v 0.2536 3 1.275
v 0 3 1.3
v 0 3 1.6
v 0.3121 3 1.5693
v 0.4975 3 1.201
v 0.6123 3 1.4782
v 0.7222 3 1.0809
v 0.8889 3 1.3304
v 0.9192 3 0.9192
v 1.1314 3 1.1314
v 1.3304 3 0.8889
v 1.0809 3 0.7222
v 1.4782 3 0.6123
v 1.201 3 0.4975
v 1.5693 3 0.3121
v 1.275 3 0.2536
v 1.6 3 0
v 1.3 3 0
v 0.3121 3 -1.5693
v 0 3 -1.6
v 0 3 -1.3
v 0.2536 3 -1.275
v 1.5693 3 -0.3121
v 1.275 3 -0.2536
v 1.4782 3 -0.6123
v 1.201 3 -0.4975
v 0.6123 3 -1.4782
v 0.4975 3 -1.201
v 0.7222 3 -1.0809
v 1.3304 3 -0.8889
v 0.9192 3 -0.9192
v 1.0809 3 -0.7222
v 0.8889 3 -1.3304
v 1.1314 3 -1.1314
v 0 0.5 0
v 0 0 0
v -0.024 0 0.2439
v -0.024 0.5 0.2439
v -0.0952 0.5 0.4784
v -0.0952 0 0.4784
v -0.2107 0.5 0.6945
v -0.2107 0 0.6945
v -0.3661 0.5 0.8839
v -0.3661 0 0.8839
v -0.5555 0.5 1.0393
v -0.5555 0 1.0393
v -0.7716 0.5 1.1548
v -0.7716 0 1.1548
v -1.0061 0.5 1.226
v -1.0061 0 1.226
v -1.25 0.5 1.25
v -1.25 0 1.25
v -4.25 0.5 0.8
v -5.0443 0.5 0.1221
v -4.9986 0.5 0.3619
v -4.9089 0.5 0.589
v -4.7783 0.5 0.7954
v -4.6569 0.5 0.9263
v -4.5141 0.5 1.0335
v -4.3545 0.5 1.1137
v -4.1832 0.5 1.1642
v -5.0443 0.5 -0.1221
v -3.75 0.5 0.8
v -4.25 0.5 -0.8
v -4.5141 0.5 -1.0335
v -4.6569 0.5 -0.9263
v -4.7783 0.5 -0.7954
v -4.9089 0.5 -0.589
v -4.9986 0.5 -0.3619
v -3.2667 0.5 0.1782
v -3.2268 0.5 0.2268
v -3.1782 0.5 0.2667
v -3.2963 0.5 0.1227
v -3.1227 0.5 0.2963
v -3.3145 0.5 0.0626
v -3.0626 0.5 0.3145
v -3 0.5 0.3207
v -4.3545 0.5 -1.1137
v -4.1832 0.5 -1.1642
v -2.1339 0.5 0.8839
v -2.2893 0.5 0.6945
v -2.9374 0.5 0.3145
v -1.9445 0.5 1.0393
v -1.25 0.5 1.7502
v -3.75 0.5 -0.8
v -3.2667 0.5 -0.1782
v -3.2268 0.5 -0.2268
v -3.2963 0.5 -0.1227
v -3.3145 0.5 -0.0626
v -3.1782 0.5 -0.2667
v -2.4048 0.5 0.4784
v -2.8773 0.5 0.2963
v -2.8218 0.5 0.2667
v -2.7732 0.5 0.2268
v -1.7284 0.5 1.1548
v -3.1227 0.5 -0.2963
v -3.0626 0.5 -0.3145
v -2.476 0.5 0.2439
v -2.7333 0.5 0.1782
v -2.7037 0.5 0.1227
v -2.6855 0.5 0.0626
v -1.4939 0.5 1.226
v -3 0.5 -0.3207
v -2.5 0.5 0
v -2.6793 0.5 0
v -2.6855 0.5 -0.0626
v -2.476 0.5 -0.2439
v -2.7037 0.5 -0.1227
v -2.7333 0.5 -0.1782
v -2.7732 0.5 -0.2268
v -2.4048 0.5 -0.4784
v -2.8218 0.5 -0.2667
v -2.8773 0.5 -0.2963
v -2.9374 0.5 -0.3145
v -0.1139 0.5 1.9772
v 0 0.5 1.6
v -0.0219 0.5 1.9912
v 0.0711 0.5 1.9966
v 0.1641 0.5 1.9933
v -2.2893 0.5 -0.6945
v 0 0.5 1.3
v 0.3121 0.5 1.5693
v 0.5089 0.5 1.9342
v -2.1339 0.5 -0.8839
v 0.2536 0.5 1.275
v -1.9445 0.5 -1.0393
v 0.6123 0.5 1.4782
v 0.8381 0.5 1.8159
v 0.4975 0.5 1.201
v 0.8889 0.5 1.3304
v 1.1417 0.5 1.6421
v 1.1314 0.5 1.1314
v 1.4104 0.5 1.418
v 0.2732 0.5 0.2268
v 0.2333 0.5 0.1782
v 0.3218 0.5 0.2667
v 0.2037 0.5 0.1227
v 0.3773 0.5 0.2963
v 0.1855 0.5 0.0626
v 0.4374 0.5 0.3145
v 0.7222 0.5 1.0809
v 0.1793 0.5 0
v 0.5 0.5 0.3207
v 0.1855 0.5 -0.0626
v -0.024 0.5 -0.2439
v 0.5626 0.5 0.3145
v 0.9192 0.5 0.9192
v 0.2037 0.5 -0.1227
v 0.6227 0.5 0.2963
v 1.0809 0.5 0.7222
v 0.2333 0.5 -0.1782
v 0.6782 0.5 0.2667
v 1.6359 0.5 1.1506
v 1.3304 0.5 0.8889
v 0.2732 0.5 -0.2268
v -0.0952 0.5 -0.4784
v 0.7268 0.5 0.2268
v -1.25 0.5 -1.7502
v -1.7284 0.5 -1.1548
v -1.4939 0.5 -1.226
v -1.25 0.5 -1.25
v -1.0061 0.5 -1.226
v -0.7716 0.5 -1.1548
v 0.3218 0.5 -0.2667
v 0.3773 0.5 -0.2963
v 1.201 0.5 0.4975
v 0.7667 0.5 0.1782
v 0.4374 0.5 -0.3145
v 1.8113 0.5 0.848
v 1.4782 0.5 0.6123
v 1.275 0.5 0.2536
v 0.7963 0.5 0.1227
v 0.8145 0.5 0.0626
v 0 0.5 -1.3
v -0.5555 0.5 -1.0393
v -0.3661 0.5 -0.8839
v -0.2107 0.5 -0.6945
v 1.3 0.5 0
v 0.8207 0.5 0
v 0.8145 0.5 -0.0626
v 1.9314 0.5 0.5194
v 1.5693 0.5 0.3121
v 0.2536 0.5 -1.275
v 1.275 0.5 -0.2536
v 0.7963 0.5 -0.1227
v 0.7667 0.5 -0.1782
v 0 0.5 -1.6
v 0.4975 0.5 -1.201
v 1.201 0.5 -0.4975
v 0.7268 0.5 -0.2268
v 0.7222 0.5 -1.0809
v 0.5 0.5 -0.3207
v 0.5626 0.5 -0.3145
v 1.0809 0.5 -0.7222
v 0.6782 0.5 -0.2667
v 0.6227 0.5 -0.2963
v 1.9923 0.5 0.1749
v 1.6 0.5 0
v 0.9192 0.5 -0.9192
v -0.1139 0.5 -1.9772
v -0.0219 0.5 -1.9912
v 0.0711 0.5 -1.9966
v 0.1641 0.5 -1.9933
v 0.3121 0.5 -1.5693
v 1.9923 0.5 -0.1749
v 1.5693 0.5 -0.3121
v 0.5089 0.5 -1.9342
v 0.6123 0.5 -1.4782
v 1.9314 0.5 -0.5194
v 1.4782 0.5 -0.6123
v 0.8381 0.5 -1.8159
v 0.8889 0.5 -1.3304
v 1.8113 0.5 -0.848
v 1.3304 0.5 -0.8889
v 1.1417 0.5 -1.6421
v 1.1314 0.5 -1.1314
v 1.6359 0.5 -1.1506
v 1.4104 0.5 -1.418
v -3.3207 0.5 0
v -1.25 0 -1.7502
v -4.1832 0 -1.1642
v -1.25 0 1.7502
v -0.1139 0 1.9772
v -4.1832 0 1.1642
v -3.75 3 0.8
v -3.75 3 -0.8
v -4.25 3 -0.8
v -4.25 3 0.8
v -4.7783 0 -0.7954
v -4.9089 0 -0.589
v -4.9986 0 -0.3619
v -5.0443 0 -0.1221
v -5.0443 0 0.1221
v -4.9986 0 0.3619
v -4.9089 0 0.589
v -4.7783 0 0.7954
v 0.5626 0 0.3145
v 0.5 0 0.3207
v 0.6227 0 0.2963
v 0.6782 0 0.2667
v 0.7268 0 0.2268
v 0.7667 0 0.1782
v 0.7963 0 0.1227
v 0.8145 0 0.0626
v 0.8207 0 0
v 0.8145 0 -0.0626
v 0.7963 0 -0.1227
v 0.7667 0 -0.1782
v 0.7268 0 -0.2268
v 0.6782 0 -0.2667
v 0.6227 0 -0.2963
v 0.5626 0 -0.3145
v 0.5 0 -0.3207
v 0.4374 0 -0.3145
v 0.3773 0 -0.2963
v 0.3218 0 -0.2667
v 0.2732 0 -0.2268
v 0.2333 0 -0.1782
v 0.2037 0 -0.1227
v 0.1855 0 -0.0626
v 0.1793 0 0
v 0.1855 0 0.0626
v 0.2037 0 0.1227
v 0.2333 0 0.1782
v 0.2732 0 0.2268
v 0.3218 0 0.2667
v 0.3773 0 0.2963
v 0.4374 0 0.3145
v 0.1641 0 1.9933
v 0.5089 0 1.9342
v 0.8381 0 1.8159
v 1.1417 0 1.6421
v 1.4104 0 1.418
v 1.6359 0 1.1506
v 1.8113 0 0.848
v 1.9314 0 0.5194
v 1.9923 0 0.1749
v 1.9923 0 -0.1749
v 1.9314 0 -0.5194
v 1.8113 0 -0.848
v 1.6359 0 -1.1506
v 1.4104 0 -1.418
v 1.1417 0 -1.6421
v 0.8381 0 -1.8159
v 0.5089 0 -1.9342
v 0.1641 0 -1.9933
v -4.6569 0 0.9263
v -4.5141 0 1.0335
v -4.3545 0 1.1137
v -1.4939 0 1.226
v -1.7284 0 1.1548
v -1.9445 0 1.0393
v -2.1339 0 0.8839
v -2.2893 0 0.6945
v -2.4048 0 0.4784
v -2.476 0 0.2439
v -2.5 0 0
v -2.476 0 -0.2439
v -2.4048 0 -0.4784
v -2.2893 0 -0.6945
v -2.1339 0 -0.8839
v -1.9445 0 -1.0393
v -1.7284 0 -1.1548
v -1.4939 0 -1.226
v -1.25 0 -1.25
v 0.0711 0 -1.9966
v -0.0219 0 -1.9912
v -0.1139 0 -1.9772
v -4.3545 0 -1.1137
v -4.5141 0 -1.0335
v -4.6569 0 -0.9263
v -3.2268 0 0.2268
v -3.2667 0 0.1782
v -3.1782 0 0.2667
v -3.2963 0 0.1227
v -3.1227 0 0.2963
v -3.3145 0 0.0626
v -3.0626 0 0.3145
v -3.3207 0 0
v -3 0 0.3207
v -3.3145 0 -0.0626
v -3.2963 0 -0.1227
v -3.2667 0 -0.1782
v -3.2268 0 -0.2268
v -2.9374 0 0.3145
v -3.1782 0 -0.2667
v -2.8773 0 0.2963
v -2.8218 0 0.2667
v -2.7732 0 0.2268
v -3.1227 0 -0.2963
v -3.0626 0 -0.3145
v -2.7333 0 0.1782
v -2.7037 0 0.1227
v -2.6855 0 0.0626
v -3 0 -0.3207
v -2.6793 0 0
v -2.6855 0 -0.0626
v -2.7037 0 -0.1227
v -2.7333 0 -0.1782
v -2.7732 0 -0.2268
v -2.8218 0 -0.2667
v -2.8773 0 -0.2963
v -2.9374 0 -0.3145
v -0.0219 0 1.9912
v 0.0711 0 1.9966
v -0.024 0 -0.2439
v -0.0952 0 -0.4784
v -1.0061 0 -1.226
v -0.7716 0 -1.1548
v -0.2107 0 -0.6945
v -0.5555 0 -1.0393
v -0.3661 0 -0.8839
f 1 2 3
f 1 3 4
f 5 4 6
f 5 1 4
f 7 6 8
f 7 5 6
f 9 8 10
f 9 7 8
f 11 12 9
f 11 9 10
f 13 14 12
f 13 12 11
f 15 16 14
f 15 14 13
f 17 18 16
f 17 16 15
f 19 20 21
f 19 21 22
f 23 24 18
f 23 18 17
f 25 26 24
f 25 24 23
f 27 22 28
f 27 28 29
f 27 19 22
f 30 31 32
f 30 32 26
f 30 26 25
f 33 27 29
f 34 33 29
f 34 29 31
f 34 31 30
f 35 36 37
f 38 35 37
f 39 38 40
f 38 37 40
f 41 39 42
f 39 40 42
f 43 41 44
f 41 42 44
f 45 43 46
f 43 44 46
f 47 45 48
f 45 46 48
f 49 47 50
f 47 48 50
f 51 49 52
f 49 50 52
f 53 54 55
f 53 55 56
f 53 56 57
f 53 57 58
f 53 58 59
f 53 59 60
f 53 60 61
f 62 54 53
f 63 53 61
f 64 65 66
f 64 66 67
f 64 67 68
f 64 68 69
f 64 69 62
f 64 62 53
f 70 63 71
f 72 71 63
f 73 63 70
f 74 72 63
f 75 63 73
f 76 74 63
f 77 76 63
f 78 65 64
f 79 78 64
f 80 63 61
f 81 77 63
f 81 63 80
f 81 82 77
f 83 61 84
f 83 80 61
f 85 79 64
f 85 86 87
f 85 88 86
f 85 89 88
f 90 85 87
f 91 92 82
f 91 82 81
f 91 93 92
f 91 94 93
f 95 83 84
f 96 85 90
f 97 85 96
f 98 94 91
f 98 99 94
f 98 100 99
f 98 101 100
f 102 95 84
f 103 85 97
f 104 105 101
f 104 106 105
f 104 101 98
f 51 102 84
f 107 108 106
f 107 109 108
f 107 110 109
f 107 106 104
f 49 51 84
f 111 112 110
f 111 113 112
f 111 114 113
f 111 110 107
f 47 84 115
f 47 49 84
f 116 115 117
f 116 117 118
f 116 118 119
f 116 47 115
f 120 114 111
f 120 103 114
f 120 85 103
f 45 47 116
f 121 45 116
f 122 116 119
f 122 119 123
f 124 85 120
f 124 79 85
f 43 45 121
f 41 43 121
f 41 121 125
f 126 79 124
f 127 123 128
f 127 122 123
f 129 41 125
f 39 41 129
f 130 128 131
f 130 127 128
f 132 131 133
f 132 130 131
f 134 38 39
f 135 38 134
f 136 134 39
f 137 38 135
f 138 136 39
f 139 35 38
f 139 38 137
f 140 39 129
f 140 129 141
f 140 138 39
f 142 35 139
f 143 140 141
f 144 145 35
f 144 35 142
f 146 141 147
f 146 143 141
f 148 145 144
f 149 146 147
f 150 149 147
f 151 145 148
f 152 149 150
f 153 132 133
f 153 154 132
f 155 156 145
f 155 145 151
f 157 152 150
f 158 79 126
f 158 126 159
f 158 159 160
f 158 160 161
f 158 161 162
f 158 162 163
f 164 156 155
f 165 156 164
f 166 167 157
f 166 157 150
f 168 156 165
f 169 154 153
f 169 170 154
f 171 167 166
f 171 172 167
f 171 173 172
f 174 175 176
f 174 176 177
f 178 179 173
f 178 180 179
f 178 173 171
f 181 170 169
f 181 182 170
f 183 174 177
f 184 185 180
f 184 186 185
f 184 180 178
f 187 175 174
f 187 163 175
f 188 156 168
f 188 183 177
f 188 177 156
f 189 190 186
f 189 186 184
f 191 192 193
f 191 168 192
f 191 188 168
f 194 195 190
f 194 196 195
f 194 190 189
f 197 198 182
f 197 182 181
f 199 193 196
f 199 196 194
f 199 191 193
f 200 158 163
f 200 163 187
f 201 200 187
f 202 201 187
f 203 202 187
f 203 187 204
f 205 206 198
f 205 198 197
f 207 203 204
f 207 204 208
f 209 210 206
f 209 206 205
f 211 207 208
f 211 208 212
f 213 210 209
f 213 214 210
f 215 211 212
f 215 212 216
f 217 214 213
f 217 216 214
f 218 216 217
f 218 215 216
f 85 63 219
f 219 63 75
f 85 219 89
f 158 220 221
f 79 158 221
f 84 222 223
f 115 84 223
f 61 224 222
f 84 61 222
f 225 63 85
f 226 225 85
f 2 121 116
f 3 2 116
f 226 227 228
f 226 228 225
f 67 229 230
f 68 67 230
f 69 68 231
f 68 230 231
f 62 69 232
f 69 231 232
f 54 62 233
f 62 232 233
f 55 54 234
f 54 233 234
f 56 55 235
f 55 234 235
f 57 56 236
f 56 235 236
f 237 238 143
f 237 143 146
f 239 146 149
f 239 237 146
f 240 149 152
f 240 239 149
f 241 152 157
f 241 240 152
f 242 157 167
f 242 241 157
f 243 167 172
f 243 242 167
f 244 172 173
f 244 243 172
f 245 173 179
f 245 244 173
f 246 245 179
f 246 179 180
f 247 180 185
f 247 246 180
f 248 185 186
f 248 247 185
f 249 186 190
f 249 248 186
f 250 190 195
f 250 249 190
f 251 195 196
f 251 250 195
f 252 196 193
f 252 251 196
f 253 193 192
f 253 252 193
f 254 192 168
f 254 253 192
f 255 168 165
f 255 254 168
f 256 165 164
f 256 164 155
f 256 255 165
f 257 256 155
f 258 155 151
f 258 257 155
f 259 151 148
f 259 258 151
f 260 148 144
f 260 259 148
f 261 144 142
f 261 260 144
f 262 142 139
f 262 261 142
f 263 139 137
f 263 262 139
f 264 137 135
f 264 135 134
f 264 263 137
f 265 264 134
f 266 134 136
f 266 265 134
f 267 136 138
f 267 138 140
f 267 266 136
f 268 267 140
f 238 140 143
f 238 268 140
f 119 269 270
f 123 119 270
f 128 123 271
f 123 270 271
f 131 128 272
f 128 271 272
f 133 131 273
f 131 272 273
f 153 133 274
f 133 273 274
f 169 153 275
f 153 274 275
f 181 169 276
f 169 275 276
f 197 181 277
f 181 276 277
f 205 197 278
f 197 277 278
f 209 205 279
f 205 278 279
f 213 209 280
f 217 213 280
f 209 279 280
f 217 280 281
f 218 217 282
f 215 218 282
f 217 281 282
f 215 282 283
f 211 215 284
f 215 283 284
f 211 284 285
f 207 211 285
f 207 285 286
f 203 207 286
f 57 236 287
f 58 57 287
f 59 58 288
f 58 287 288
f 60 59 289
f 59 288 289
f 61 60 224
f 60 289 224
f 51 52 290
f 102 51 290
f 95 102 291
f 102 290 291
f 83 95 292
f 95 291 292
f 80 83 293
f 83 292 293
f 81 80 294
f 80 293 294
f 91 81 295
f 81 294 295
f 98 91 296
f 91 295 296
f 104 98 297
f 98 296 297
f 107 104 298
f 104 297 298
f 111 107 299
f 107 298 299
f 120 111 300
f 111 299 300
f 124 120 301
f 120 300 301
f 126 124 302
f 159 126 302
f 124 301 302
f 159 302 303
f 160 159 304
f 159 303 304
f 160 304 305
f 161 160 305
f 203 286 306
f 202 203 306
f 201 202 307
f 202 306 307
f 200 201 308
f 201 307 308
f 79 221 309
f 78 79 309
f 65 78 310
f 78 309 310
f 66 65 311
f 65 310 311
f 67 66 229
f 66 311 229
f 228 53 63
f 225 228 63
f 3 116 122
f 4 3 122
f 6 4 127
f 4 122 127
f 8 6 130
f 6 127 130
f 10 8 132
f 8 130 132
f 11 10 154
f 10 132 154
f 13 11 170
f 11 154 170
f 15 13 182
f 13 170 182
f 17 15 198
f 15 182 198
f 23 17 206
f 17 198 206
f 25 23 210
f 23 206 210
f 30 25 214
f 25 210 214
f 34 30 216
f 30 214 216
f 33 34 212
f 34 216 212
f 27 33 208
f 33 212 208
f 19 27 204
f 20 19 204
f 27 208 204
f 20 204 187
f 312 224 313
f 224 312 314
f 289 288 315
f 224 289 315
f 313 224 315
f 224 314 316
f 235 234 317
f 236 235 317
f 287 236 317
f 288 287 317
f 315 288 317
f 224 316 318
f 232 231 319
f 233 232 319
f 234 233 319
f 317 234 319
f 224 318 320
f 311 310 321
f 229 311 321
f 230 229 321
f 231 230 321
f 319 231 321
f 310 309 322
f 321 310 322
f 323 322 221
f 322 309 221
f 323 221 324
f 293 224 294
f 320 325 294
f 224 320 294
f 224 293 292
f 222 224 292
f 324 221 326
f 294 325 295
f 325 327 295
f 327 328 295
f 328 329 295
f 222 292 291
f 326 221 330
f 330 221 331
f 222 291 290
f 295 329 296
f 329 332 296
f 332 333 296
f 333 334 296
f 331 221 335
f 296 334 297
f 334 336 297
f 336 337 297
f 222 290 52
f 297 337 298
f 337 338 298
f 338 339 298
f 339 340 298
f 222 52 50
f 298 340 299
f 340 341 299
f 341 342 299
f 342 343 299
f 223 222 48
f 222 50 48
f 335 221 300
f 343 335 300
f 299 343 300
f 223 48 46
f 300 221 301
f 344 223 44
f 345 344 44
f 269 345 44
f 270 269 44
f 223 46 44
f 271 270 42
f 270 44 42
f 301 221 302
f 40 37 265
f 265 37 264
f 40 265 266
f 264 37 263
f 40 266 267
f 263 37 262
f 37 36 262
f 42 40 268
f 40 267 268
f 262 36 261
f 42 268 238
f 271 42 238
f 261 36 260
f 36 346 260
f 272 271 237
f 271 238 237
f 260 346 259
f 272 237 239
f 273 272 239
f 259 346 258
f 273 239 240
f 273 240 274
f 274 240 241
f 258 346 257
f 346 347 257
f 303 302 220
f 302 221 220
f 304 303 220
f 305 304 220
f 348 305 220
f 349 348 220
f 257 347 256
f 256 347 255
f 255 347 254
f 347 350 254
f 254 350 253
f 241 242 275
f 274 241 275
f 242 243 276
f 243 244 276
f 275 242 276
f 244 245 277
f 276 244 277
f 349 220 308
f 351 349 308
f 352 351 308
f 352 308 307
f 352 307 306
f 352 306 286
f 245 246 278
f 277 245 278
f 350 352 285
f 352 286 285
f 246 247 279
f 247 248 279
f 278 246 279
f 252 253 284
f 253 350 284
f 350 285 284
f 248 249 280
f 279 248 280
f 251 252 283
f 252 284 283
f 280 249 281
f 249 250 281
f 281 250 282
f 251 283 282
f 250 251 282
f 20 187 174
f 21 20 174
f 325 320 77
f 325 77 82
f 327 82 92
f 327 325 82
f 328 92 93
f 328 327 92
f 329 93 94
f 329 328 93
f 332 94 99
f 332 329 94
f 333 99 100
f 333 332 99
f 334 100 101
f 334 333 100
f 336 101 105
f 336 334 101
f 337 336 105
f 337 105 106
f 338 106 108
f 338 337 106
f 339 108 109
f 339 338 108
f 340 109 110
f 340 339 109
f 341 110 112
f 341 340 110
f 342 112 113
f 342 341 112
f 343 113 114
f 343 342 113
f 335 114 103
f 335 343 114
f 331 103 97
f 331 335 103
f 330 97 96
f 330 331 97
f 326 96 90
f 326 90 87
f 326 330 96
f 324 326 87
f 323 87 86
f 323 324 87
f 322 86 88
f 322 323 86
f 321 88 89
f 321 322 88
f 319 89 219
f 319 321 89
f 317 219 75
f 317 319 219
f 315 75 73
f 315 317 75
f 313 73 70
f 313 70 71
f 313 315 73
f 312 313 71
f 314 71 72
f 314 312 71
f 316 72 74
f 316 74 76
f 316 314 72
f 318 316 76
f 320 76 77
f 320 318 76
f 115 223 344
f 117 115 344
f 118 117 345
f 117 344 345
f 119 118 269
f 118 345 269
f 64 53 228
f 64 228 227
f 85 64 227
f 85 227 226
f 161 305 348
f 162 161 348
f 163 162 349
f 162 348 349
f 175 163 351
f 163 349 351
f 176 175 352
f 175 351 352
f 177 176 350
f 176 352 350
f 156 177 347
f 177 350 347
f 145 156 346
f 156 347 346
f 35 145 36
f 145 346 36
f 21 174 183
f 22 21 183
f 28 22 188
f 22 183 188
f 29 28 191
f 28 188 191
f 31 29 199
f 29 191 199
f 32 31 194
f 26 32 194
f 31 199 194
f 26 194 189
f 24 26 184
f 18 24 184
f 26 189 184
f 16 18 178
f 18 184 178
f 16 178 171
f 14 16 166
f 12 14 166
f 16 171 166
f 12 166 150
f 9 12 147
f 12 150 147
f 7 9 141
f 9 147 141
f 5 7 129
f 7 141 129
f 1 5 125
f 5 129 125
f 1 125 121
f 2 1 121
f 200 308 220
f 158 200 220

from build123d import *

# Parameters (mm, degrees)
SKETCH1_R           = 1.25
SKETCH1_R_2         = 0.3207
BOSS_EXTRUDE1_DEPTH = 0.5
SKETCH1_24_W        = 0.5
SKETCH1_24_H        = 1.6
BOSS_EXTRUDE2_DEPTH = 3


with BuildPart() as part:
    # Sketch1 → Boss-Extrude1 (new body)
    with BuildSketch(Plane(origin=(0, 0, 0), x_dir=(1, 0, 0), z_dir=(0, 1, 0))):
        with BuildLine():
            ThreePointArc((0.1641009, 1.993256355), (0.024548565, 1.994973575), (-0.113883759, 1.977245221))
            Line((-0.113883759, 1.977245221), (-4.183235691, 1.164159973))
            ThreePointArc((-4.183235691, 1.164159973), (-4.514100231, 1.033532975), (-4.77830642, 0.795352694))
            ThreePointArc((-4.77830642, 0.795352694), (-5.05, 0), (-4.77830642, -0.795352694))
            ThreePointArc((-4.77830642, -0.795352694), (-4.514100231, -1.033532975), (-4.183235691, -1.164159973))
            Line((-4.183235691, -1.164159973), (-0.11388376, -1.977245221))
            ThreePointArc((-0.11388376, -1.977245221), (0.024548564, -1.994973575), (0.164100898, -1.993256355))
            ThreePointArc((0.164100898, -1.993256355), (2, -1e-09), (0.1641009, 1.993256355))
        make_face()
        with Locations((-1.25, 0)):
            Circle(SKETCH1_R, mode=Mode.SUBTRACT)
        with Locations((0.5, 0)):
            Circle(SKETCH1_R_2, mode=Mode.SUBTRACT)
        with Locations((-3, 0)):
            Circle(SKETCH1_R_2, mode=Mode.SUBTRACT)
    extrude(amount=BOSS_EXTRUDE1_DEPTH)

    # Sketch1<24> → Boss-Extrude2 (add)
    with BuildSketch(Plane(origin=(0, 0, 0), x_dir=(1, 0, 0), z_dir=(0, 1, 0))):
        with BuildLine():
            ThreePointArc((0, -1.6), (1.6, 0), (0, 1.6))
            Line((0, 1.6), (0, 1.3))
            ThreePointArc((0, 1.3), (1.3, 0), (0, -1.3))
            Line((0, -1.3), (0, -1.6))
        make_face()
        with Locations((-4, 0)):
            Rectangle(SKETCH1_24_W, SKETCH1_24_H)
    extrude(amount=BOSS_EXTRUDE2_DEPTH)


solid = part.part
